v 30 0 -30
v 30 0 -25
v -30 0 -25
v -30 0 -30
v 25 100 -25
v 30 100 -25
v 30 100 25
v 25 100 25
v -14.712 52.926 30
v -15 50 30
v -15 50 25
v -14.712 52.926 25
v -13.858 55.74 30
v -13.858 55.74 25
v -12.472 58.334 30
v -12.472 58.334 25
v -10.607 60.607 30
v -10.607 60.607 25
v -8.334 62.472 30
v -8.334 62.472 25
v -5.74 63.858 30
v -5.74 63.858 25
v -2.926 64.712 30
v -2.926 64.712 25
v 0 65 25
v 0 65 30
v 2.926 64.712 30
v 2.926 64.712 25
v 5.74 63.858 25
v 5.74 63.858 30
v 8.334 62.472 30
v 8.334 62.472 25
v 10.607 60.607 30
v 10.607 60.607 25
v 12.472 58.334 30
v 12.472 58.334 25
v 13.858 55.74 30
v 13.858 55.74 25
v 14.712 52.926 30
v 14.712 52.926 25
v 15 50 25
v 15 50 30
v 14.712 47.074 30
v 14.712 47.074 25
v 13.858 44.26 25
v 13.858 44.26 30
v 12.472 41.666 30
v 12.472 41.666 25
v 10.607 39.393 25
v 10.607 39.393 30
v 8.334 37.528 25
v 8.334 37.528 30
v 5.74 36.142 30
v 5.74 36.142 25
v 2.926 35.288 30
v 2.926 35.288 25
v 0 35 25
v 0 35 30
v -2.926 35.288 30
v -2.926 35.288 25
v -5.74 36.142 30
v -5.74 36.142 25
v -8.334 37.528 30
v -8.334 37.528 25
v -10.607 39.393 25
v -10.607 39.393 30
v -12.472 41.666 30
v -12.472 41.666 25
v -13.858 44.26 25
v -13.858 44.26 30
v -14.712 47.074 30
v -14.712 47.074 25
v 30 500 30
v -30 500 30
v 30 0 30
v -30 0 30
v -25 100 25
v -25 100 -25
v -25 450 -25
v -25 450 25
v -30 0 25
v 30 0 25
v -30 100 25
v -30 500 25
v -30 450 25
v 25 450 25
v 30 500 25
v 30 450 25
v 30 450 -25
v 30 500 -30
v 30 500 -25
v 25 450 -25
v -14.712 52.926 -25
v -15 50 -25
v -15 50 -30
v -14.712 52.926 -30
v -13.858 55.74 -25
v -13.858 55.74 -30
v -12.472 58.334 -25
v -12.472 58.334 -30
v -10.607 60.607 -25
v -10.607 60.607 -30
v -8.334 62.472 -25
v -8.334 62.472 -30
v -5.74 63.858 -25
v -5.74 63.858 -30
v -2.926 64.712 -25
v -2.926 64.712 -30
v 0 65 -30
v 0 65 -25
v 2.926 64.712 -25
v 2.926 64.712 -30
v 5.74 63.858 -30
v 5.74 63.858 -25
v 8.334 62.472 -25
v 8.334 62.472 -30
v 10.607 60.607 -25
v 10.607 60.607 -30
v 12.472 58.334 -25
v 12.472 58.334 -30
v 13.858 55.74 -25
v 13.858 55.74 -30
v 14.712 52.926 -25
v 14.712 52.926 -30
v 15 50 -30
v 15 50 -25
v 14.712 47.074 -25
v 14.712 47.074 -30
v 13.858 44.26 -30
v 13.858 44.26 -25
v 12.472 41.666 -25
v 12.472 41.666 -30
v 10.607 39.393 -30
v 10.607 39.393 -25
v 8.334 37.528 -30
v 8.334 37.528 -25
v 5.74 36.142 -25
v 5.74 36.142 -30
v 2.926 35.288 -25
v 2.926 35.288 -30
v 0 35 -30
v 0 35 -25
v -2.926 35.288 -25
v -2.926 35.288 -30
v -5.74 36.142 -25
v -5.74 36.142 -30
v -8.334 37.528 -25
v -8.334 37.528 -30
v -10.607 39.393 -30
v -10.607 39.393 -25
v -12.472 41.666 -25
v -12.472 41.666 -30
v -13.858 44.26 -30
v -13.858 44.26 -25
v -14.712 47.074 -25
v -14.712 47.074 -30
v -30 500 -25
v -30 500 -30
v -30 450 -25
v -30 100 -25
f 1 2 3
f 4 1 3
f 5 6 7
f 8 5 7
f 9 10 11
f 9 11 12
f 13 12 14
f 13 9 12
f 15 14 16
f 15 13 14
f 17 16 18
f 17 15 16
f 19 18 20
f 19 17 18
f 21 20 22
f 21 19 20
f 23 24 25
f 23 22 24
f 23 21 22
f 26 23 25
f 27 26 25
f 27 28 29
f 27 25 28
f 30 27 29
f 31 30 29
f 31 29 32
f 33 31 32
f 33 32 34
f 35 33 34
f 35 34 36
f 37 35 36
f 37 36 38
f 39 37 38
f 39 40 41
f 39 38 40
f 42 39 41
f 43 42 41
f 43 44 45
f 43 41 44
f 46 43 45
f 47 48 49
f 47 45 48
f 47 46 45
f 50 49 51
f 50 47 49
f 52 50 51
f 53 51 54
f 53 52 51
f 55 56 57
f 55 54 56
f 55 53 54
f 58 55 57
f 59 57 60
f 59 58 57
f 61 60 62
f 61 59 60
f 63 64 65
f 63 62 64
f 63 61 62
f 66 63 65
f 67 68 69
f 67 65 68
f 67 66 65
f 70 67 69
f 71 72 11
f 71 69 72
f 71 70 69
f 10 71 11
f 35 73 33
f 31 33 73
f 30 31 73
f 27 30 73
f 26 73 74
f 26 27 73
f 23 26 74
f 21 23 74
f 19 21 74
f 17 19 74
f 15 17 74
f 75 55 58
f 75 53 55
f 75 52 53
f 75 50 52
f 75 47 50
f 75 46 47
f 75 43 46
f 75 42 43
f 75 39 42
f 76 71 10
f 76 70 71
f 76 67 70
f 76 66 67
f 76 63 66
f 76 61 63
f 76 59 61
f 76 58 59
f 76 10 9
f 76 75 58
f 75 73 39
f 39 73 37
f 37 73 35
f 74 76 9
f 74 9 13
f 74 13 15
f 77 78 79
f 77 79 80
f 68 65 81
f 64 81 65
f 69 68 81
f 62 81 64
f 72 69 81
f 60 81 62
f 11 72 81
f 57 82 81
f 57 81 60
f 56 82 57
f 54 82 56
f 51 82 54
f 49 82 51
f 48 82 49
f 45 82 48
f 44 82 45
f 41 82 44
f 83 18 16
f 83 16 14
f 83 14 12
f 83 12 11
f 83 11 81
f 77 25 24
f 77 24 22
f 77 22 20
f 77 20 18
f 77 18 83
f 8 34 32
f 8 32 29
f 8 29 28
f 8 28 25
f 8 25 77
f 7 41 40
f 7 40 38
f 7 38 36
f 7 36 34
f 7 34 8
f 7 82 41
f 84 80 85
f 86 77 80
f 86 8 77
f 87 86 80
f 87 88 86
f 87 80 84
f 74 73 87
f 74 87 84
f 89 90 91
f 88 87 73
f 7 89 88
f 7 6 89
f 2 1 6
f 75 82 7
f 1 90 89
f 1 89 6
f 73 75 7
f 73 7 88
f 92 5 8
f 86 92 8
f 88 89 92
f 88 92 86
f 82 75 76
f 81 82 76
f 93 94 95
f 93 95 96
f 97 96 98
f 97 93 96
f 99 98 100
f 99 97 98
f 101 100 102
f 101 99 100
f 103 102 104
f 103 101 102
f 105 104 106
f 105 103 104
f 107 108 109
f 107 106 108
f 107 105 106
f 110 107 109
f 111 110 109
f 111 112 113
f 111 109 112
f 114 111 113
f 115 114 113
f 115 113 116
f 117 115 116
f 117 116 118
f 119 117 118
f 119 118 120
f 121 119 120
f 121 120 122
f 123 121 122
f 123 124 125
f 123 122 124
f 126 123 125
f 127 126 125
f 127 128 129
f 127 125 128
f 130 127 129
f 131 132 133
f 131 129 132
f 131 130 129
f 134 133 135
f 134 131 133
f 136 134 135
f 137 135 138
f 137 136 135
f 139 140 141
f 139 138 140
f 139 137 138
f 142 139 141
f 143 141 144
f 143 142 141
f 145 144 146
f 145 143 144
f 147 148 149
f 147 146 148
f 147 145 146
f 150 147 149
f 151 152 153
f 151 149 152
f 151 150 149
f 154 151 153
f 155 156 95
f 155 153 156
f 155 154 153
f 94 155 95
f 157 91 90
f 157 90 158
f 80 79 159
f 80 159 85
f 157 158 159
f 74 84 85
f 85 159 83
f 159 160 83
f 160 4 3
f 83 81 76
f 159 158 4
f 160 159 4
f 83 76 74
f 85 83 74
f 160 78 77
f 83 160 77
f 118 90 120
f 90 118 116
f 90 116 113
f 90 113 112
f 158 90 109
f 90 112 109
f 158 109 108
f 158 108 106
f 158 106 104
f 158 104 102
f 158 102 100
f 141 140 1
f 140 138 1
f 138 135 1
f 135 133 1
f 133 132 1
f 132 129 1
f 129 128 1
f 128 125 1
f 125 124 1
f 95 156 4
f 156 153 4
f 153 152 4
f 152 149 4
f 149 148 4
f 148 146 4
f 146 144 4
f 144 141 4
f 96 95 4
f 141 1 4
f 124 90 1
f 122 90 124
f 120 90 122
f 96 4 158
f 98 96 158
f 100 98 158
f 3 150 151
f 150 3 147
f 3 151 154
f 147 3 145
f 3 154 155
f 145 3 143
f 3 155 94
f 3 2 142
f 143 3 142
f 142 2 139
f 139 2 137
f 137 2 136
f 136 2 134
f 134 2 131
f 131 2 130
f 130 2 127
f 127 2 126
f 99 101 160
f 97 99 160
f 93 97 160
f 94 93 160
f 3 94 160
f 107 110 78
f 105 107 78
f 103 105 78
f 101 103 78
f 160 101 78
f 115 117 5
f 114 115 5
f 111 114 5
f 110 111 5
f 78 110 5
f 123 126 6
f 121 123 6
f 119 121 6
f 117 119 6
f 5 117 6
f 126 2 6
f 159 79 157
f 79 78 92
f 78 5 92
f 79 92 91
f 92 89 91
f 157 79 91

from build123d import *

# Parameters (mm, degrees)
SKETCH2_W               = 60
SKETCH2_H               = 60
BOSS_EXTRUDE1_DEPTH     = 500
SHELL1_T                = -5
SKETCH3_W               = 100
SKETCH3_H               = 50
SKETCH3_W_2             = 50
CUT_EXTRUDE1_DEPTH      = 505.479930225
CUT_EXTRUDE3_DEPTH      = 504.909714135
CUT_EXTRUDE3_DEPTH_BACK = 504.909714135
SKETCH4_R               = 15


with BuildPart() as part:
    # Sketch2 → Boss-Extrude1 (new body)
    with BuildSketch(Plane(origin=(0, 0, 0), x_dir=(-1, 0, 0), z_dir=(0, 1, 0))):
        Rectangle(SKETCH2_W, SKETCH2_H)
    extrude(amount=BOSS_EXTRUDE1_DEPTH)

    # Shell1
    shell1_openings = [part.faces().sort_by_distance(p)[0] for p in [
        (0, 0, 0),
        (0, 500, 0),
    ]]
    offset(amount=SHELL1_T, openings=shell1_openings, kind=Kind.INTERSECTION)

    # Sketch3 → Cut-Extrude1 (cut, through all)
    with BuildSketch(Plane.YZ.offset(30)):
        with Locations((50, 0)):
            Rectangle(SKETCH3_W, SKETCH3_H)
        with Locations((475, 0)):
            Rectangle(SKETCH3_W_2, SKETCH3_H)
    extrude(amount=-CUT_EXTRUDE1_DEPTH, mode=Mode.SUBTRACT)

    # Sketch4 → Cut-Extrude3 (cut, two sides: drawn at the far end of the back side and taken through both)
    with BuildSketch(Plane(origin=(0, 0, 25), x_dir=(1, 0, 0), z_dir=(0, 0, -1)).offset(-CUT_EXTRUDE3_DEPTH_BACK)):
        with Locations((0, -50)):
            Circle(SKETCH4_R)
    extrude(amount=CUT_EXTRUDE3_DEPTH + CUT_EXTRUDE3_DEPTH_BACK, mode=Mode.SUBTRACT)


solid = part.part
